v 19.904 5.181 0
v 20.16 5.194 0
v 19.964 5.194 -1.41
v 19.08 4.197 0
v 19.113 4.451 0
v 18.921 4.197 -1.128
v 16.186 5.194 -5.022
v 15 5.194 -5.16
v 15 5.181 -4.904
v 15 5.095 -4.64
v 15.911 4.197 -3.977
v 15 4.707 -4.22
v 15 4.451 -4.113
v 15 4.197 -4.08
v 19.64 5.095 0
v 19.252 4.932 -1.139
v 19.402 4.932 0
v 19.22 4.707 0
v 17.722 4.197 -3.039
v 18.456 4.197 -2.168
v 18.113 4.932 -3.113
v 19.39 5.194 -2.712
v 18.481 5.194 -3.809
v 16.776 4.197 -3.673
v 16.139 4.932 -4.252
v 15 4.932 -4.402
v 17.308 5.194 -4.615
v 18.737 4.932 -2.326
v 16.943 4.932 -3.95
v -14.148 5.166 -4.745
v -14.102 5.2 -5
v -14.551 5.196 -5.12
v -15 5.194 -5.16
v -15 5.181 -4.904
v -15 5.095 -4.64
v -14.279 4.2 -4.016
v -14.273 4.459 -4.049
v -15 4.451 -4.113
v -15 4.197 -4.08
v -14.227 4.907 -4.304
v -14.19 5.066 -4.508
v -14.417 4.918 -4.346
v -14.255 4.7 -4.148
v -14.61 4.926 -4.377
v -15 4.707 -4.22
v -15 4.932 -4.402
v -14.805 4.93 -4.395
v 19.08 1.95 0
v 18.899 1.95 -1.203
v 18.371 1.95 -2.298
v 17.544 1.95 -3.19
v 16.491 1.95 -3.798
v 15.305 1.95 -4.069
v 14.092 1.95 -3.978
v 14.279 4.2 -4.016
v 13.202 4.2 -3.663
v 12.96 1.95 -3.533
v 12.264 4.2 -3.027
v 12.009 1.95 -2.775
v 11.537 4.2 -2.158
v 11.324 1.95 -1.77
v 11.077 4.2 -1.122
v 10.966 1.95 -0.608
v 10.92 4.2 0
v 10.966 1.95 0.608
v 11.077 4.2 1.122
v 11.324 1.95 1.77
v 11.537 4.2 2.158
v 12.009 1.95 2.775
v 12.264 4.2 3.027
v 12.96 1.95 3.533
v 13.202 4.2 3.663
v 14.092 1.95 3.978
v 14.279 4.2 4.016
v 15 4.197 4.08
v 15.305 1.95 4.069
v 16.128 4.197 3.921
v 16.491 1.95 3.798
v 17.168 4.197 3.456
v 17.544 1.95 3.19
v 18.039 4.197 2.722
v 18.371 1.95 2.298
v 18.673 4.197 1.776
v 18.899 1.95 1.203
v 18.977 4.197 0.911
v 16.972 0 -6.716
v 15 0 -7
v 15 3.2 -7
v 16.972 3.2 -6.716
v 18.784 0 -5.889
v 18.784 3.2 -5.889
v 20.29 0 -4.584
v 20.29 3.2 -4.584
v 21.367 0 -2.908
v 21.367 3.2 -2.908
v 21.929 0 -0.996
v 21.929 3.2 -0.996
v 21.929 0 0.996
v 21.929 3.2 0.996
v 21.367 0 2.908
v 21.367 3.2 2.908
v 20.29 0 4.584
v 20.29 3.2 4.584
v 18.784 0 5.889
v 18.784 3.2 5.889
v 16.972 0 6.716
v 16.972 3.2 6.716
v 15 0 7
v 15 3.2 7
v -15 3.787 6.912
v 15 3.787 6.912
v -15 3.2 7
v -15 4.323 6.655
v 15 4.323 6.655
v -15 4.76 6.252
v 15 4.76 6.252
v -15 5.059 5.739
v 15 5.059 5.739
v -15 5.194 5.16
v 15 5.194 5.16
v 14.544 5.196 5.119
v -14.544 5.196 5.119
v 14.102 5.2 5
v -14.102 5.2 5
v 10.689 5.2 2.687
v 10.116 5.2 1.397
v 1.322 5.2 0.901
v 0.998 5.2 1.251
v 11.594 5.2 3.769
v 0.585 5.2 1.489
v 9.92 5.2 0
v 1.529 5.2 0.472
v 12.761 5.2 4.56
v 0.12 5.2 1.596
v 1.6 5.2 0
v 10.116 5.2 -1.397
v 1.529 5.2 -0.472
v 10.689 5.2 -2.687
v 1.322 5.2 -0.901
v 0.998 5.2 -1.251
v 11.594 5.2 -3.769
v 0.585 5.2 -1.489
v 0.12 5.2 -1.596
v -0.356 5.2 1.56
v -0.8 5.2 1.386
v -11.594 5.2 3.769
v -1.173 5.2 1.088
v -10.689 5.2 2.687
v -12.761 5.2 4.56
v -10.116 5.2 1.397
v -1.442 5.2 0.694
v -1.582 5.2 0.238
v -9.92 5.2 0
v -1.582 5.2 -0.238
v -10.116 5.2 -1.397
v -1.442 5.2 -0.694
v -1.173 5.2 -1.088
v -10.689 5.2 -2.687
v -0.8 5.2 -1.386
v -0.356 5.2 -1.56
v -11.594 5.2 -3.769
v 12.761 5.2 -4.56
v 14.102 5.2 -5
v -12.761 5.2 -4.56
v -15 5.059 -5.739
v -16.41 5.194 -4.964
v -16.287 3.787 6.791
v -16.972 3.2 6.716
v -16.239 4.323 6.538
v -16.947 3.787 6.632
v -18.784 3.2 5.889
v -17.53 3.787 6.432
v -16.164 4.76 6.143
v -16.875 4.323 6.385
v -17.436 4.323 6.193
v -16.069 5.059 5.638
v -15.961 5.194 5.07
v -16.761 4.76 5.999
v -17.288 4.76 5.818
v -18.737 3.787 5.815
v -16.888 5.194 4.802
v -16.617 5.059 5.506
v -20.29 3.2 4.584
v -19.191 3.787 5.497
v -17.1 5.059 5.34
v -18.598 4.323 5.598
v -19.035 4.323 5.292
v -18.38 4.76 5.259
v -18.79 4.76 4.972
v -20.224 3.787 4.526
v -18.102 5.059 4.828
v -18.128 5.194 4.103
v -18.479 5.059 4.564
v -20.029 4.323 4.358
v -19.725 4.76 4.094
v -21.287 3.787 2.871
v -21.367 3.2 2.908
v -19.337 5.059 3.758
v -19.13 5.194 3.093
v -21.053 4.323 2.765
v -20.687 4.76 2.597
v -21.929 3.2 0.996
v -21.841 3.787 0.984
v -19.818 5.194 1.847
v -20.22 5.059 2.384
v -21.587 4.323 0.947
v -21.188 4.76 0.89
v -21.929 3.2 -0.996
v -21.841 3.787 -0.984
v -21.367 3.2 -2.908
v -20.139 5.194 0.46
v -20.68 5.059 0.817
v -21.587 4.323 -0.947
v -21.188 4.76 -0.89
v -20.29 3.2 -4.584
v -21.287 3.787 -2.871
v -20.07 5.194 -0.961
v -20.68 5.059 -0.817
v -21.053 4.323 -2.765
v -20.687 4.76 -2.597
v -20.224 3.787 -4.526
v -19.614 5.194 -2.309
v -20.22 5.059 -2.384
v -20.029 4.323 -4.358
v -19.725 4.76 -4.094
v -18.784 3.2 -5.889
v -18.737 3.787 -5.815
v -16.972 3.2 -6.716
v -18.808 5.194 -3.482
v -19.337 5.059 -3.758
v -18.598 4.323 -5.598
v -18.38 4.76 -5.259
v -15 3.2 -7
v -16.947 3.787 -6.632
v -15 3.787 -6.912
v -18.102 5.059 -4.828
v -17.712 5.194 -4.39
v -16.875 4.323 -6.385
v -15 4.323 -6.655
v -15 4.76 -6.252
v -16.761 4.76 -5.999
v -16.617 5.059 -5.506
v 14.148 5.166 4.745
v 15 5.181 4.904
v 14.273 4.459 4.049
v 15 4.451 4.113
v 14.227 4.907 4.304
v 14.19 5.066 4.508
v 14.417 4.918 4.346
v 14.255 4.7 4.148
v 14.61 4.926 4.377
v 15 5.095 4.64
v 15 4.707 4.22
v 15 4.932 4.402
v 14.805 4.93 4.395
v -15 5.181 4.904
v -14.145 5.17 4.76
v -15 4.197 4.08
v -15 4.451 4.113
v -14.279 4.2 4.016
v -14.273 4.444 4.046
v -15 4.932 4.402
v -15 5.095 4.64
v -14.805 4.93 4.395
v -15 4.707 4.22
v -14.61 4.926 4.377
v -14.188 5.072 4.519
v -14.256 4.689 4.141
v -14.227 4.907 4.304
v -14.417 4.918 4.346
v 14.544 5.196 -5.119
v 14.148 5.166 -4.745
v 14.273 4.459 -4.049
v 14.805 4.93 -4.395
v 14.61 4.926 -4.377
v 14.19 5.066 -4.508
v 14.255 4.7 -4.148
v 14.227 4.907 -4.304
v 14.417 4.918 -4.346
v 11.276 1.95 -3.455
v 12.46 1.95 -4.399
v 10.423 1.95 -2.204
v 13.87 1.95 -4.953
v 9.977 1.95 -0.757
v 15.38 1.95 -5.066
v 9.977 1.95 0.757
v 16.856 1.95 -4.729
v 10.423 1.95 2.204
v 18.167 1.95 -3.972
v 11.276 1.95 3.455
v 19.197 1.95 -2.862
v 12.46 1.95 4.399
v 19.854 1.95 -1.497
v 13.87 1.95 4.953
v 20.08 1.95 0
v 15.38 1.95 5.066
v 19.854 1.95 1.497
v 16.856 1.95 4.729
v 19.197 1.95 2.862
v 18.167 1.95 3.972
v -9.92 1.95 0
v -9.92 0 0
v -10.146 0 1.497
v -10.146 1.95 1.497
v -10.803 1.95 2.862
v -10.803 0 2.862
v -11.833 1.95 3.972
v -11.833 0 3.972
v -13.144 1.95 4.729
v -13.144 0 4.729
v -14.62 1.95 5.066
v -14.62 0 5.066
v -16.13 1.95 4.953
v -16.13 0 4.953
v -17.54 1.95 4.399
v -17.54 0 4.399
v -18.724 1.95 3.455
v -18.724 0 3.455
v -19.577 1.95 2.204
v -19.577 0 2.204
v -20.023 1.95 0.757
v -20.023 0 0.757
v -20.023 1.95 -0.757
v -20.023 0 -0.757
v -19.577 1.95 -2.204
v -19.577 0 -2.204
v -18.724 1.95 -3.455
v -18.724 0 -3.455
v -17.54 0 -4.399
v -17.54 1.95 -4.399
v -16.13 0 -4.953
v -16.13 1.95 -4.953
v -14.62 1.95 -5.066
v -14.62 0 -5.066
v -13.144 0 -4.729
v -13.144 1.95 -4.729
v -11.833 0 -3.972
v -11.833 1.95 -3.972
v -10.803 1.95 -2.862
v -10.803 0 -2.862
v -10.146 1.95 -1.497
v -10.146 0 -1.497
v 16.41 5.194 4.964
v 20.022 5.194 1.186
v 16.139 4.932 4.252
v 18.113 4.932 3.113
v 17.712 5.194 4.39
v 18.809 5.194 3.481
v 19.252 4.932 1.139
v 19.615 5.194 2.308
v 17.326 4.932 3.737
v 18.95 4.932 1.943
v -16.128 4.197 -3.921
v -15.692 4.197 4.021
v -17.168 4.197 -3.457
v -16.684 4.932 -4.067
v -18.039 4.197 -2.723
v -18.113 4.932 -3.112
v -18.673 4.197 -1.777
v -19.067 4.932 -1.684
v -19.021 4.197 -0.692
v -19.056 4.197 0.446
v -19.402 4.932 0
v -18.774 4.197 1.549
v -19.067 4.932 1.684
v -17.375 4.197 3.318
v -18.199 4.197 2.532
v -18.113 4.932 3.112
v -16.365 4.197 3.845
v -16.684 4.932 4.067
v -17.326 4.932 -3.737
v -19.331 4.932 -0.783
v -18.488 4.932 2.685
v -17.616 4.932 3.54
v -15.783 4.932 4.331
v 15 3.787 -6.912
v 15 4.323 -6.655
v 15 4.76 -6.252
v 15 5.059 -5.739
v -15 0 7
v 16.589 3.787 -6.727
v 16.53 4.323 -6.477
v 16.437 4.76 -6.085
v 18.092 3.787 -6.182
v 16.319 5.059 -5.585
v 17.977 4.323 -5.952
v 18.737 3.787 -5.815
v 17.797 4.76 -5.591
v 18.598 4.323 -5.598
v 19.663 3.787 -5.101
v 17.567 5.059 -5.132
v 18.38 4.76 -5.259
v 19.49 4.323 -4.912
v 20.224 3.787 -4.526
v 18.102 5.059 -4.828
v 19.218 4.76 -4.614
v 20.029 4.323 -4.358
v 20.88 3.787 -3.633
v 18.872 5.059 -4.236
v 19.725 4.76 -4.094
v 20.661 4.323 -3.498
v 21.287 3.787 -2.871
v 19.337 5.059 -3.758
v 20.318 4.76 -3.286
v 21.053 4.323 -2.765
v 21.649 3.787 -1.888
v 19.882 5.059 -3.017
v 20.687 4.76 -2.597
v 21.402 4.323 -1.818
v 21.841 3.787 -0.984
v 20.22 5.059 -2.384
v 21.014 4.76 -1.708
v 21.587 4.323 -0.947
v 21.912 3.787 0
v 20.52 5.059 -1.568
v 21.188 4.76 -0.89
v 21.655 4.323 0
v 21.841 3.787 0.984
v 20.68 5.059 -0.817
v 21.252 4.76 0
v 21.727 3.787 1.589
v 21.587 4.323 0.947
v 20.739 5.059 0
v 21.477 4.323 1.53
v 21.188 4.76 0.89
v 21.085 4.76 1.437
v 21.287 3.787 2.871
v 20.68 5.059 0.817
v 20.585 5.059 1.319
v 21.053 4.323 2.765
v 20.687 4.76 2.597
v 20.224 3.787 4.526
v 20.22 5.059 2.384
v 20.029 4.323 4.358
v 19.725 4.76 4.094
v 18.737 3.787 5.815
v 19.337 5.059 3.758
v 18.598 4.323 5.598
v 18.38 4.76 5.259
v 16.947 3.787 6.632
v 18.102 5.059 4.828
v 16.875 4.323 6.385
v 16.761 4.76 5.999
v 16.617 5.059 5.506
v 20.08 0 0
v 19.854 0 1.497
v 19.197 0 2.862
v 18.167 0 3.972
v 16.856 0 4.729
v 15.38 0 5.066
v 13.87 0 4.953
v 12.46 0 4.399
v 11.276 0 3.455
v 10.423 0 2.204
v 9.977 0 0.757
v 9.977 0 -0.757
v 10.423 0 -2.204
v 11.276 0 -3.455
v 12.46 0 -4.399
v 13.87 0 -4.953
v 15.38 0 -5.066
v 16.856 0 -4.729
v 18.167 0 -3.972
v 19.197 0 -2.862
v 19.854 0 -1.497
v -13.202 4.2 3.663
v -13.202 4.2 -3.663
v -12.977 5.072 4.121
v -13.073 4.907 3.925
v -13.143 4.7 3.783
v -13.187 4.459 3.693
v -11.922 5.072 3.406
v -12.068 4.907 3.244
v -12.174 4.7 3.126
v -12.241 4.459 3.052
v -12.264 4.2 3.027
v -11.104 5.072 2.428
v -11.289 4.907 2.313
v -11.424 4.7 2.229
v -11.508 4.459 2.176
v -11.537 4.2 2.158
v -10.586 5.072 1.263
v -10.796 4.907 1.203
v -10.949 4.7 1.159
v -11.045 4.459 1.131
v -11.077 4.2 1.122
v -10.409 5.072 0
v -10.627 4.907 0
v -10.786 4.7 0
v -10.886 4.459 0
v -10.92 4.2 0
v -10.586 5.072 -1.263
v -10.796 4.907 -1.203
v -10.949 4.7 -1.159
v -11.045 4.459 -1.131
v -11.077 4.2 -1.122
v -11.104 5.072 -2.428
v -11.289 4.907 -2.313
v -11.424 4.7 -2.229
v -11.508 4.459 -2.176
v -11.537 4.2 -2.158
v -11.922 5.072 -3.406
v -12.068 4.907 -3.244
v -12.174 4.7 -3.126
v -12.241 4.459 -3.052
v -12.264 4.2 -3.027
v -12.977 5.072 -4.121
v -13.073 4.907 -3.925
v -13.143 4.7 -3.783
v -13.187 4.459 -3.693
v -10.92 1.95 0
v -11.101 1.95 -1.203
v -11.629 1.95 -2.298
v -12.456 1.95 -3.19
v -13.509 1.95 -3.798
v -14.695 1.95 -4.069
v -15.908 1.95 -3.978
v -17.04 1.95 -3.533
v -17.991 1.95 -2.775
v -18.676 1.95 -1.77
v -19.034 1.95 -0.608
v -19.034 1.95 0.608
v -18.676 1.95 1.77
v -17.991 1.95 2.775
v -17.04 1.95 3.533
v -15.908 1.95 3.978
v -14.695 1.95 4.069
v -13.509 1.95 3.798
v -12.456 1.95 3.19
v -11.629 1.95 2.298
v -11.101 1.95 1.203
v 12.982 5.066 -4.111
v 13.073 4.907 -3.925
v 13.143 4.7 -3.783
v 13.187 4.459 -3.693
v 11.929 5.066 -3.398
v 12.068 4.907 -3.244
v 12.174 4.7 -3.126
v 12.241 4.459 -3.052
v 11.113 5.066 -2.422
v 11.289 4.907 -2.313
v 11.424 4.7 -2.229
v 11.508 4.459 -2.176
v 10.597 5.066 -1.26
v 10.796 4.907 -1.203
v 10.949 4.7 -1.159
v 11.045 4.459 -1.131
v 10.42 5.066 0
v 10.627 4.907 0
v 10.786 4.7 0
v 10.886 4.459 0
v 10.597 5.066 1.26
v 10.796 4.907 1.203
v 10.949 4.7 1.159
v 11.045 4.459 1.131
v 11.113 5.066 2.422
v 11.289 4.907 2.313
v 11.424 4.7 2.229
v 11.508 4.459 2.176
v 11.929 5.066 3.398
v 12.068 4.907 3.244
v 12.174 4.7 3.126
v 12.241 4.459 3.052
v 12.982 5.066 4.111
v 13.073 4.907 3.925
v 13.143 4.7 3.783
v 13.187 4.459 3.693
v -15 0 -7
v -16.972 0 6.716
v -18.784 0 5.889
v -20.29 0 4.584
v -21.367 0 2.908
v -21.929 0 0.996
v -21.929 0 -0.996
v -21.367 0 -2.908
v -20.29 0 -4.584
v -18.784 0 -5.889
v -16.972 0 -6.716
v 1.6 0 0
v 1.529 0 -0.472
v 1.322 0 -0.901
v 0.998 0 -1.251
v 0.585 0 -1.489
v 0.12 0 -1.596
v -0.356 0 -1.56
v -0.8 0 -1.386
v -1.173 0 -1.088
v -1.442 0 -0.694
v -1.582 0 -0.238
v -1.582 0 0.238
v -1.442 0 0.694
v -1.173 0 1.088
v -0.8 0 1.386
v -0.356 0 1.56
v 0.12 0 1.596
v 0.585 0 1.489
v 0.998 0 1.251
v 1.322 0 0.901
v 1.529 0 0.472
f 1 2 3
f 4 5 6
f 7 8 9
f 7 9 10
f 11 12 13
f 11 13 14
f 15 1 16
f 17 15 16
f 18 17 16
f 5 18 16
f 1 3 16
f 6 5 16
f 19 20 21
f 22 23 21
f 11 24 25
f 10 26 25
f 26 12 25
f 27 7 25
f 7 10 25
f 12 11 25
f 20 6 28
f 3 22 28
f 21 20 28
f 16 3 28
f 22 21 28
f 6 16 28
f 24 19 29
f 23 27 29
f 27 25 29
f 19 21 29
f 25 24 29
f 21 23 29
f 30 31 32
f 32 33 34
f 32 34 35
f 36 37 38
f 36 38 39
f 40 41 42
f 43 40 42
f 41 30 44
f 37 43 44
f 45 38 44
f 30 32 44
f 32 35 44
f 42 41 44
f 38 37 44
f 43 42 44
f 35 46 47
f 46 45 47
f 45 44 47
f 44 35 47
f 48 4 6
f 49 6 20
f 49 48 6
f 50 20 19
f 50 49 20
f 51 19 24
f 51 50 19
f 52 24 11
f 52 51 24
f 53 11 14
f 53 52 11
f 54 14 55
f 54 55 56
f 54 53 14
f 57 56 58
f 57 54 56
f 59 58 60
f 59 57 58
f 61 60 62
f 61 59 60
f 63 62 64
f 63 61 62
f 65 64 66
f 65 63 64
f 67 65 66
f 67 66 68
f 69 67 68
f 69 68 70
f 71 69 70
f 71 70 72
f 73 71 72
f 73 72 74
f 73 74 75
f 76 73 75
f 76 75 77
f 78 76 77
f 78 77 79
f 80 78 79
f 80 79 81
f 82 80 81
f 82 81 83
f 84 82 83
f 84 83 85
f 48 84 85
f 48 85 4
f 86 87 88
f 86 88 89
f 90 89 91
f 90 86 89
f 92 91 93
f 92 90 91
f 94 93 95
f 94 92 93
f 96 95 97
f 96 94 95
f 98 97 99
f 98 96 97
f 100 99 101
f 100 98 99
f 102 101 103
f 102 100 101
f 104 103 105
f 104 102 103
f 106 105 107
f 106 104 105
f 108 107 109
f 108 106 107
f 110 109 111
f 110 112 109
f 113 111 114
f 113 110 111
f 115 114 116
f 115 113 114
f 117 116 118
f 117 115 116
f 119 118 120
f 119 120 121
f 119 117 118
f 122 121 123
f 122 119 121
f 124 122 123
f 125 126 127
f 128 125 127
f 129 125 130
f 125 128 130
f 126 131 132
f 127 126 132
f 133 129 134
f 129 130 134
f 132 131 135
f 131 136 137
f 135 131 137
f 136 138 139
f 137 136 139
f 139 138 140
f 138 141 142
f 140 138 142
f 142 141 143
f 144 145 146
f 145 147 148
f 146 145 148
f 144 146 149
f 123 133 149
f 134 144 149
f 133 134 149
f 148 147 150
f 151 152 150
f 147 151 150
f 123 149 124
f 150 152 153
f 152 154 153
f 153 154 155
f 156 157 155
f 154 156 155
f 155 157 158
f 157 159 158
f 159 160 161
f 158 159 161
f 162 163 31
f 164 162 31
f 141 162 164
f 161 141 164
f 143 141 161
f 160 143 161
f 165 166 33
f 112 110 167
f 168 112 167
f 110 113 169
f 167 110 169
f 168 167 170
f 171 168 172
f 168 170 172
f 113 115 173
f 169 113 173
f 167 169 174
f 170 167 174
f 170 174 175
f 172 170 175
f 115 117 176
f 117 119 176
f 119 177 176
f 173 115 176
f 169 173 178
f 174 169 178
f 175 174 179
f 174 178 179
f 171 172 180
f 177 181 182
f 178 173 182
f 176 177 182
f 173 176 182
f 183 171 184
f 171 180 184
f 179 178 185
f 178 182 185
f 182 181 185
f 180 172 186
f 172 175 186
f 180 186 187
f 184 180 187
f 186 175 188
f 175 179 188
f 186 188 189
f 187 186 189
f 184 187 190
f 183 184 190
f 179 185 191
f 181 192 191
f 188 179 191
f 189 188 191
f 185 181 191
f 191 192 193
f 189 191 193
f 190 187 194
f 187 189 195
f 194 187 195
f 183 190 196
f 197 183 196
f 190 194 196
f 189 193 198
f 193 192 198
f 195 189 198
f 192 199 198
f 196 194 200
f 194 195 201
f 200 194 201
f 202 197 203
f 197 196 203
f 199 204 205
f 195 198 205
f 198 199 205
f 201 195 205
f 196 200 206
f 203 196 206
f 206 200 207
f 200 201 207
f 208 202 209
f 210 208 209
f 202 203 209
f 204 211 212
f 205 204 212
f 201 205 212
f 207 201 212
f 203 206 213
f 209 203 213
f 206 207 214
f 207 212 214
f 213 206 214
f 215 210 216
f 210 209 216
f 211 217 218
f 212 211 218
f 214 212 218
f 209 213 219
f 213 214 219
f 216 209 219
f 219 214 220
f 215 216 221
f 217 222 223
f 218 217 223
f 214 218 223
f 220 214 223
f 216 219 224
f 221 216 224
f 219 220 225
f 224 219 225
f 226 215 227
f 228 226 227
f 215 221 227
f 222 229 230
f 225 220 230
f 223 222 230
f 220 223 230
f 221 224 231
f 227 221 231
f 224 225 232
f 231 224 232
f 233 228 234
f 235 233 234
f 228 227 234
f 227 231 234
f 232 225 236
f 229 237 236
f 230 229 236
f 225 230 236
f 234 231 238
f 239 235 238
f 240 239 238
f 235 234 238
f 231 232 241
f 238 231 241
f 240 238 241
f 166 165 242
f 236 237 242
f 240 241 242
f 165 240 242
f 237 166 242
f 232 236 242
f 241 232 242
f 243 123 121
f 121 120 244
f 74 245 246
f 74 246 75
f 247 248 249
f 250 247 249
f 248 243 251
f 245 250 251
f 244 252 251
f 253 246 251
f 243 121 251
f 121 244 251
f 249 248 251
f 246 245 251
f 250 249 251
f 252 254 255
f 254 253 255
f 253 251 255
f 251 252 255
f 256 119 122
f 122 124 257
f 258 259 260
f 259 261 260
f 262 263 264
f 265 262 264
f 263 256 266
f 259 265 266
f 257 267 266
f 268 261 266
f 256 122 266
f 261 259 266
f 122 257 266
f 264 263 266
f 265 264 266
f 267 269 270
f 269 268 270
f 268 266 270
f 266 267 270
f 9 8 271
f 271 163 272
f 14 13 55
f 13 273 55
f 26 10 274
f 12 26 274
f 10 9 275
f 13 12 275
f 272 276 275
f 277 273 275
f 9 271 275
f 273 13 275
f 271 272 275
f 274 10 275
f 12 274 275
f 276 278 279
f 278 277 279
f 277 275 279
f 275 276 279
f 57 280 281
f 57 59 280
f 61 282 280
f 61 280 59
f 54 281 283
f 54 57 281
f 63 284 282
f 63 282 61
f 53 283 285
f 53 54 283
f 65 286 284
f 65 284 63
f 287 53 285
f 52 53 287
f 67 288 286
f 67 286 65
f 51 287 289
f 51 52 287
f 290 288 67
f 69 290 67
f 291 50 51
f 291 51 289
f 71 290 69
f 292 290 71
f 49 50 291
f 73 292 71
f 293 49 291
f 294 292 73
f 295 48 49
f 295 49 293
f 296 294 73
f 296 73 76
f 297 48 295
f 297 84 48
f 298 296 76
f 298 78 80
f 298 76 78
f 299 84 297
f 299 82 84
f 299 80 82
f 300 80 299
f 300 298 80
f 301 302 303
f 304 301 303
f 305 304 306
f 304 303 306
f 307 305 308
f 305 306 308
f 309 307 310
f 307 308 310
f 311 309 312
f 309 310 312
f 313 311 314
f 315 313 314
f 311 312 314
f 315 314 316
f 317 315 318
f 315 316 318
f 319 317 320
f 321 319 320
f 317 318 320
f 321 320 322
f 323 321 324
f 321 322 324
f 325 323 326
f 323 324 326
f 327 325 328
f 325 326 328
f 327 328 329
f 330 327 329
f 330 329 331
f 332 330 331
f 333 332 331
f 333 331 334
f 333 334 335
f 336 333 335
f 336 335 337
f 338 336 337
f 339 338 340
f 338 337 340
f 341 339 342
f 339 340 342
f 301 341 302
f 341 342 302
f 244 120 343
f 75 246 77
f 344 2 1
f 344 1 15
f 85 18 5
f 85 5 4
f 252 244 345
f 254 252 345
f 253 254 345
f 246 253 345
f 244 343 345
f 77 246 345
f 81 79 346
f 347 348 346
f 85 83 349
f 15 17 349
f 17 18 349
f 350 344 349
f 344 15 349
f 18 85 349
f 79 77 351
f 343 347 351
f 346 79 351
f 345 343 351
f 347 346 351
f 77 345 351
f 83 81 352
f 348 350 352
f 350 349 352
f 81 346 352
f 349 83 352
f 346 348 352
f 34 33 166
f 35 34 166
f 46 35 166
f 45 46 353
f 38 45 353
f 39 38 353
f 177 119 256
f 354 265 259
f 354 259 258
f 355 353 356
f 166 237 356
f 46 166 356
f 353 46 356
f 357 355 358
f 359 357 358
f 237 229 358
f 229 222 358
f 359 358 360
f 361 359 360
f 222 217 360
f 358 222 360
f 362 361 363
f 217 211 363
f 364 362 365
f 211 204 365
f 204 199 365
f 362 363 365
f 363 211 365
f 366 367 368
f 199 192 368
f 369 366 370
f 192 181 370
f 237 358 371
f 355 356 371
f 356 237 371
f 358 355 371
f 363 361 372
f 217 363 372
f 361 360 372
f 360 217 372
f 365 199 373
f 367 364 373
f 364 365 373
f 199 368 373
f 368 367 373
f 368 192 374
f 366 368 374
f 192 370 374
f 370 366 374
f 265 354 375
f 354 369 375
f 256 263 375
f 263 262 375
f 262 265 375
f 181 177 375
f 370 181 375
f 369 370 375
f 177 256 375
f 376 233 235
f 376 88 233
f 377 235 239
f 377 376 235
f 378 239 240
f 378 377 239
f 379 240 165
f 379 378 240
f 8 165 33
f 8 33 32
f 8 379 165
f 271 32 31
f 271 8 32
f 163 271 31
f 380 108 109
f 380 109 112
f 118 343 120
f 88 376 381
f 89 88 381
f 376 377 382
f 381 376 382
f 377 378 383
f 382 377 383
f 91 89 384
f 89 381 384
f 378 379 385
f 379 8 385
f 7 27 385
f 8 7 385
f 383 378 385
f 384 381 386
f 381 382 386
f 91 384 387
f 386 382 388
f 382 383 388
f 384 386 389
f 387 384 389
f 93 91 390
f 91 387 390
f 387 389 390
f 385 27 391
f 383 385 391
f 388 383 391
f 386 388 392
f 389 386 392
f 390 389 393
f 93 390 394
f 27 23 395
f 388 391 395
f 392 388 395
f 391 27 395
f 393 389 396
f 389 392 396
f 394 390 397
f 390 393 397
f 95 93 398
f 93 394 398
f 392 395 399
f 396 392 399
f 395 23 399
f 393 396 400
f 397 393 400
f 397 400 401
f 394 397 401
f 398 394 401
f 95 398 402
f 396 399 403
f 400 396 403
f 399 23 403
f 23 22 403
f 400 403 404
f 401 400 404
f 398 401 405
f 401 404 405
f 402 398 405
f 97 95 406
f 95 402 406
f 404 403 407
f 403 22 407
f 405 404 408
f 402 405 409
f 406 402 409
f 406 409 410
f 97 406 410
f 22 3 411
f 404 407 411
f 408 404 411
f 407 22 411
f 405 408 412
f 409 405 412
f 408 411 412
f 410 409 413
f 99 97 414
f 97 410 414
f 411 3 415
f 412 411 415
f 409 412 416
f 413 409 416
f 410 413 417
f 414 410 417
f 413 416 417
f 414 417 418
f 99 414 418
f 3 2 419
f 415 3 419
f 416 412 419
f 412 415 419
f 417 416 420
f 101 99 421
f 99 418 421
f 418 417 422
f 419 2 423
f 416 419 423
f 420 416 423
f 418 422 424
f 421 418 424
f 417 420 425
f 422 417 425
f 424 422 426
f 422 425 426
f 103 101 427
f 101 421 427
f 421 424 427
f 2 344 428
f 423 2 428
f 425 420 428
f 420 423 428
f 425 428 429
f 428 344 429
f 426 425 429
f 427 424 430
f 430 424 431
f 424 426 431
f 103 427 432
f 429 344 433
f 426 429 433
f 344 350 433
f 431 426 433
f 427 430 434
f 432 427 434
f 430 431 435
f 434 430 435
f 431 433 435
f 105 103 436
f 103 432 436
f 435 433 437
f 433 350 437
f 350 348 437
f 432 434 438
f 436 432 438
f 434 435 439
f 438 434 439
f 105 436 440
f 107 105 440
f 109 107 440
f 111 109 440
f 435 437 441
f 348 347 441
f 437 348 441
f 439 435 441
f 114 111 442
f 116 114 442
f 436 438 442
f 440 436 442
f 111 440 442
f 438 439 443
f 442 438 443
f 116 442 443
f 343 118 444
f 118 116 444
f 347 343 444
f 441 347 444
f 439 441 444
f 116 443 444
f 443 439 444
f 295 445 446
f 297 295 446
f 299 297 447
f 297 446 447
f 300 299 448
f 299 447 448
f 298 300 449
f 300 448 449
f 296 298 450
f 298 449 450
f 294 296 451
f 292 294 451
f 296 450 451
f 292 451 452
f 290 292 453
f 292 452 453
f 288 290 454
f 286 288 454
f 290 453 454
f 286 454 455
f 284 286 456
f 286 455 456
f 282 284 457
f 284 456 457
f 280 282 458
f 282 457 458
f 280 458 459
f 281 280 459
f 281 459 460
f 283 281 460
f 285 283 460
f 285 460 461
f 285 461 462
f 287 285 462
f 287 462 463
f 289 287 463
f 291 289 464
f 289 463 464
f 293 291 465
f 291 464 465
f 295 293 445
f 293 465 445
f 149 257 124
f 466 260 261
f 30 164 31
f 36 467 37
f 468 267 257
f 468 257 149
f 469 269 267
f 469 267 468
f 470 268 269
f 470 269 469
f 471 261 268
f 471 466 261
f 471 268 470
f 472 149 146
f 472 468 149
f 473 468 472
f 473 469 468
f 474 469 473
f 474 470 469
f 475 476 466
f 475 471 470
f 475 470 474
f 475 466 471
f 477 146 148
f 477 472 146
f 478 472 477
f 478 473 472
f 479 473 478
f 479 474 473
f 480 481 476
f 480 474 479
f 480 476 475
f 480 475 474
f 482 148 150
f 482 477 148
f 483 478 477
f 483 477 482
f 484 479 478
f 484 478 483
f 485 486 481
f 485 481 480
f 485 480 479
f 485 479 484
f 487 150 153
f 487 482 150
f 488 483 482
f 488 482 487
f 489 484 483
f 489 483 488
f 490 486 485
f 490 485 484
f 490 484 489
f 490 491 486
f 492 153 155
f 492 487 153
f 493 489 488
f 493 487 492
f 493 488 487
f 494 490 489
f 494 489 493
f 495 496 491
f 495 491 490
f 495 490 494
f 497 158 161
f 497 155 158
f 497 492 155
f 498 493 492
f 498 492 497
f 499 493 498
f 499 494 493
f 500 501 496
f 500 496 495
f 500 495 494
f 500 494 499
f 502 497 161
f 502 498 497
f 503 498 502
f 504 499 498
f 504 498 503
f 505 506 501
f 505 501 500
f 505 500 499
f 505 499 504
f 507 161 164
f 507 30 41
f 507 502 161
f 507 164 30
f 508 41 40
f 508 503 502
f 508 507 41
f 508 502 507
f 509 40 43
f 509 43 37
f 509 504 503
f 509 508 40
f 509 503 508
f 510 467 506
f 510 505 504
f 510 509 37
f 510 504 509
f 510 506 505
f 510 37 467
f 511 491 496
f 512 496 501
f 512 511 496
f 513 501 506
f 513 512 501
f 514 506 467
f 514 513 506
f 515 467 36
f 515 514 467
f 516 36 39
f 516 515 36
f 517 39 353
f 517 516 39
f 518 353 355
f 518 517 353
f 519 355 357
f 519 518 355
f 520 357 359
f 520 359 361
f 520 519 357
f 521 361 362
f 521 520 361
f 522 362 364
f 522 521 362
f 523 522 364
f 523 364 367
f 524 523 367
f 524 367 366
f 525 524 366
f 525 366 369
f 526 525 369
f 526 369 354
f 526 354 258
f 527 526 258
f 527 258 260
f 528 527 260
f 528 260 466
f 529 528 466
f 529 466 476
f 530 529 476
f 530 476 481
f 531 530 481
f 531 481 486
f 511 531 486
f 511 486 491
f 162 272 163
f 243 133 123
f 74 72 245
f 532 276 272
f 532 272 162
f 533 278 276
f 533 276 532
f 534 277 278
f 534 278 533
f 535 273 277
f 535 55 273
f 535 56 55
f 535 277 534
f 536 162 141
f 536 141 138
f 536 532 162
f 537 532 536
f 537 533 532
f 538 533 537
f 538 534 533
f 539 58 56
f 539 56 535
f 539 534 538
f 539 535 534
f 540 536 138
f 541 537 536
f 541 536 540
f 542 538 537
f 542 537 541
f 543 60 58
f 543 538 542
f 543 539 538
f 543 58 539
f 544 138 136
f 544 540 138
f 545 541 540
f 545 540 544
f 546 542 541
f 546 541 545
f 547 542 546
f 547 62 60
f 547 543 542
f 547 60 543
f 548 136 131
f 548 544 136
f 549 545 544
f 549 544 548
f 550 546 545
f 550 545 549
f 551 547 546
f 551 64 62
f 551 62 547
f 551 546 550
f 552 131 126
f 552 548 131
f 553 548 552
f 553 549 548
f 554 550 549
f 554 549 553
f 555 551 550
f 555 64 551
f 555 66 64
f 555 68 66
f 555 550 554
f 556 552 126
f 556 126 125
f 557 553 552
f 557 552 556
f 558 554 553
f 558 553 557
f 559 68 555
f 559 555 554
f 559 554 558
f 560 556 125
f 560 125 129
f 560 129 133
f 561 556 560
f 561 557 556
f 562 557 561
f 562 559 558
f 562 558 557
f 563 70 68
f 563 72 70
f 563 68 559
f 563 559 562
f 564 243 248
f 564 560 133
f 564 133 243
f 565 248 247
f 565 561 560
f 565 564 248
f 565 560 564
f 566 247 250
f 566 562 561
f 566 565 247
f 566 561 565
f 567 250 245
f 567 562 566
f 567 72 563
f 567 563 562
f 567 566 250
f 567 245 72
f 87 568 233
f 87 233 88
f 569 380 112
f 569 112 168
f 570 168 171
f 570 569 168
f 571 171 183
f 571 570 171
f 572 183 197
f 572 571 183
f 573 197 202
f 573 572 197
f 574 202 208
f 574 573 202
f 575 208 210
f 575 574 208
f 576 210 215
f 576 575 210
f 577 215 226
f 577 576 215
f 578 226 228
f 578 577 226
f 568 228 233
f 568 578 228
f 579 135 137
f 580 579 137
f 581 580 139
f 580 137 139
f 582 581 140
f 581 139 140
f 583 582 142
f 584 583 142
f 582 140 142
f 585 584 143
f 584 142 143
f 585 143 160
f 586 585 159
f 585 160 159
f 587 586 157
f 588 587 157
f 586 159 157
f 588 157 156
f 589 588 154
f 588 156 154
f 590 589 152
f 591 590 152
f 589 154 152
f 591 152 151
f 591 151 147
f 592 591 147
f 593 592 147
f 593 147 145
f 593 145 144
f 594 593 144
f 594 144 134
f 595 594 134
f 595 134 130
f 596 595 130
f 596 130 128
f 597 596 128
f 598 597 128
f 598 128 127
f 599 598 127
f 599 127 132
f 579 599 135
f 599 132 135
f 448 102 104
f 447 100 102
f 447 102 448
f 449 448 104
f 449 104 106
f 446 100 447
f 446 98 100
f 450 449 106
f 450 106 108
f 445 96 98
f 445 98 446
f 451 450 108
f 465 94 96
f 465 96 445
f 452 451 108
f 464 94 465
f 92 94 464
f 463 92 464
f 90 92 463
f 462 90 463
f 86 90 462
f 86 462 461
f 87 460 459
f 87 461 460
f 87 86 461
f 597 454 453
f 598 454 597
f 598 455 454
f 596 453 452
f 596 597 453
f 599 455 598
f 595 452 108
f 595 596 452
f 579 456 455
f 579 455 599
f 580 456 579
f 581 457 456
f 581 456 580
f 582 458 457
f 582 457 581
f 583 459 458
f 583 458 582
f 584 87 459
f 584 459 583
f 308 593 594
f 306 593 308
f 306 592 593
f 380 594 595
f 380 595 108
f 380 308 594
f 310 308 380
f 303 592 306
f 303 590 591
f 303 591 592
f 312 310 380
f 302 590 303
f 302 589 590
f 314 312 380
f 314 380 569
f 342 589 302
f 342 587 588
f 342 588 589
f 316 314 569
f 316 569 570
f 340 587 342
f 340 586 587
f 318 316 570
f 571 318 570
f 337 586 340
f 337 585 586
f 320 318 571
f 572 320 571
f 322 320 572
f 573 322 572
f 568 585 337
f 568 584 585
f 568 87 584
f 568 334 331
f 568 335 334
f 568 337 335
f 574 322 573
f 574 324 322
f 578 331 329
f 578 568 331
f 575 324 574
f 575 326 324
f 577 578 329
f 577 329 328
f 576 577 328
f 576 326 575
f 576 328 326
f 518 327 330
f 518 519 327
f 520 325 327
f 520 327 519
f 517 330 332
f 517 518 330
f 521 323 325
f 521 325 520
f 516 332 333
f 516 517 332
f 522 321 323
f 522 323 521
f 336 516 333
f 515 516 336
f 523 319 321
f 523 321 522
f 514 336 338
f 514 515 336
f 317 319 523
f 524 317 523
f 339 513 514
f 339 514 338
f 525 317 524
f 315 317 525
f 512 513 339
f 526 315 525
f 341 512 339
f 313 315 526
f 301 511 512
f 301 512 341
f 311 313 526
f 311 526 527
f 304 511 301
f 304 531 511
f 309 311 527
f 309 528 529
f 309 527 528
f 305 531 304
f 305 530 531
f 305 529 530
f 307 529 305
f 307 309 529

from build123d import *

# Parameters (mm, degrees)
SKETCH1_R           = 4.08
BOSS_EXTRUDE1_DEPTH = 5.2
SKETCH2_R           = 1.6
CUT_EXTRUDE1_DEPTH  = 5.2
SKETCH3_R           = 5.08
CUT_EXTRUDE2_DEPTH  = 1.95
FILLET1_R           = 2
FILLET2_R           = 1


with BuildPart() as part:
    # Sketch1 → Boss-Extrude1 (new body)
    with BuildSketch(Plane(origin=(0, 0, 0), x_dir=(1, 0, 0), z_dir=(0, 1, 0))):
        with BuildLine():
            Line((-15, 7), (15, 7))
            ThreePointArc((15, 7), (22, 0), (15, -7))
            Line((15, -7), (-15, -7))
            ThreePointArc((-15, -7), (-22, 0), (-15, 7))
        make_face()
        with Locations((-15, 0)):
            Circle(SKETCH1_R, mode=Mode.SUBTRACT)
        with Locations((15, 0)):
            Circle(SKETCH1_R, mode=Mode.SUBTRACT)
    extrude(amount=BOSS_EXTRUDE1_DEPTH)

    # Sketch2 → Cut-Extrude1 (cut)
    with BuildSketch(Plane(origin=(0, 5.2, 0), x_dir=(1, 0, 0), z_dir=(0, 1, 0))):
        Circle(SKETCH2_R)
    extrude(amount=-CUT_EXTRUDE1_DEPTH, mode=Mode.SUBTRACT)

    # Sketch3 → Cut-Extrude2 (cut)
    with BuildSketch(Plane.XZ):
        with Locations((-15, 0)):
            Circle(SKETCH3_R)
        with Locations((15, 0)):
            Circle(SKETCH3_R)
    extrude(amount=-CUT_EXTRUDE2_DEPTH, mode=Mode.SUBTRACT)

    # Fillet1
    fillet1_edges = [part.edges().sort_by_distance(p)[0] for p in [
        (22, 5.2, 0),
        (0, 5.2, -7),
        (-22, 5.2, 0),
        (0, 5.2, 7),
    ]]
    fillet(fillet1_edges, radius=FILLET1_R)

    # Fillet2
    fillet2_edges = [part.edges().sort_by_distance(p)[0] for p in [
        (10.92, 5.2, 0),
        (-19.08, 5.2, 0),
    ]]
    fillet(fillet2_edges, radius=FILLET2_R)


solid = part.part
